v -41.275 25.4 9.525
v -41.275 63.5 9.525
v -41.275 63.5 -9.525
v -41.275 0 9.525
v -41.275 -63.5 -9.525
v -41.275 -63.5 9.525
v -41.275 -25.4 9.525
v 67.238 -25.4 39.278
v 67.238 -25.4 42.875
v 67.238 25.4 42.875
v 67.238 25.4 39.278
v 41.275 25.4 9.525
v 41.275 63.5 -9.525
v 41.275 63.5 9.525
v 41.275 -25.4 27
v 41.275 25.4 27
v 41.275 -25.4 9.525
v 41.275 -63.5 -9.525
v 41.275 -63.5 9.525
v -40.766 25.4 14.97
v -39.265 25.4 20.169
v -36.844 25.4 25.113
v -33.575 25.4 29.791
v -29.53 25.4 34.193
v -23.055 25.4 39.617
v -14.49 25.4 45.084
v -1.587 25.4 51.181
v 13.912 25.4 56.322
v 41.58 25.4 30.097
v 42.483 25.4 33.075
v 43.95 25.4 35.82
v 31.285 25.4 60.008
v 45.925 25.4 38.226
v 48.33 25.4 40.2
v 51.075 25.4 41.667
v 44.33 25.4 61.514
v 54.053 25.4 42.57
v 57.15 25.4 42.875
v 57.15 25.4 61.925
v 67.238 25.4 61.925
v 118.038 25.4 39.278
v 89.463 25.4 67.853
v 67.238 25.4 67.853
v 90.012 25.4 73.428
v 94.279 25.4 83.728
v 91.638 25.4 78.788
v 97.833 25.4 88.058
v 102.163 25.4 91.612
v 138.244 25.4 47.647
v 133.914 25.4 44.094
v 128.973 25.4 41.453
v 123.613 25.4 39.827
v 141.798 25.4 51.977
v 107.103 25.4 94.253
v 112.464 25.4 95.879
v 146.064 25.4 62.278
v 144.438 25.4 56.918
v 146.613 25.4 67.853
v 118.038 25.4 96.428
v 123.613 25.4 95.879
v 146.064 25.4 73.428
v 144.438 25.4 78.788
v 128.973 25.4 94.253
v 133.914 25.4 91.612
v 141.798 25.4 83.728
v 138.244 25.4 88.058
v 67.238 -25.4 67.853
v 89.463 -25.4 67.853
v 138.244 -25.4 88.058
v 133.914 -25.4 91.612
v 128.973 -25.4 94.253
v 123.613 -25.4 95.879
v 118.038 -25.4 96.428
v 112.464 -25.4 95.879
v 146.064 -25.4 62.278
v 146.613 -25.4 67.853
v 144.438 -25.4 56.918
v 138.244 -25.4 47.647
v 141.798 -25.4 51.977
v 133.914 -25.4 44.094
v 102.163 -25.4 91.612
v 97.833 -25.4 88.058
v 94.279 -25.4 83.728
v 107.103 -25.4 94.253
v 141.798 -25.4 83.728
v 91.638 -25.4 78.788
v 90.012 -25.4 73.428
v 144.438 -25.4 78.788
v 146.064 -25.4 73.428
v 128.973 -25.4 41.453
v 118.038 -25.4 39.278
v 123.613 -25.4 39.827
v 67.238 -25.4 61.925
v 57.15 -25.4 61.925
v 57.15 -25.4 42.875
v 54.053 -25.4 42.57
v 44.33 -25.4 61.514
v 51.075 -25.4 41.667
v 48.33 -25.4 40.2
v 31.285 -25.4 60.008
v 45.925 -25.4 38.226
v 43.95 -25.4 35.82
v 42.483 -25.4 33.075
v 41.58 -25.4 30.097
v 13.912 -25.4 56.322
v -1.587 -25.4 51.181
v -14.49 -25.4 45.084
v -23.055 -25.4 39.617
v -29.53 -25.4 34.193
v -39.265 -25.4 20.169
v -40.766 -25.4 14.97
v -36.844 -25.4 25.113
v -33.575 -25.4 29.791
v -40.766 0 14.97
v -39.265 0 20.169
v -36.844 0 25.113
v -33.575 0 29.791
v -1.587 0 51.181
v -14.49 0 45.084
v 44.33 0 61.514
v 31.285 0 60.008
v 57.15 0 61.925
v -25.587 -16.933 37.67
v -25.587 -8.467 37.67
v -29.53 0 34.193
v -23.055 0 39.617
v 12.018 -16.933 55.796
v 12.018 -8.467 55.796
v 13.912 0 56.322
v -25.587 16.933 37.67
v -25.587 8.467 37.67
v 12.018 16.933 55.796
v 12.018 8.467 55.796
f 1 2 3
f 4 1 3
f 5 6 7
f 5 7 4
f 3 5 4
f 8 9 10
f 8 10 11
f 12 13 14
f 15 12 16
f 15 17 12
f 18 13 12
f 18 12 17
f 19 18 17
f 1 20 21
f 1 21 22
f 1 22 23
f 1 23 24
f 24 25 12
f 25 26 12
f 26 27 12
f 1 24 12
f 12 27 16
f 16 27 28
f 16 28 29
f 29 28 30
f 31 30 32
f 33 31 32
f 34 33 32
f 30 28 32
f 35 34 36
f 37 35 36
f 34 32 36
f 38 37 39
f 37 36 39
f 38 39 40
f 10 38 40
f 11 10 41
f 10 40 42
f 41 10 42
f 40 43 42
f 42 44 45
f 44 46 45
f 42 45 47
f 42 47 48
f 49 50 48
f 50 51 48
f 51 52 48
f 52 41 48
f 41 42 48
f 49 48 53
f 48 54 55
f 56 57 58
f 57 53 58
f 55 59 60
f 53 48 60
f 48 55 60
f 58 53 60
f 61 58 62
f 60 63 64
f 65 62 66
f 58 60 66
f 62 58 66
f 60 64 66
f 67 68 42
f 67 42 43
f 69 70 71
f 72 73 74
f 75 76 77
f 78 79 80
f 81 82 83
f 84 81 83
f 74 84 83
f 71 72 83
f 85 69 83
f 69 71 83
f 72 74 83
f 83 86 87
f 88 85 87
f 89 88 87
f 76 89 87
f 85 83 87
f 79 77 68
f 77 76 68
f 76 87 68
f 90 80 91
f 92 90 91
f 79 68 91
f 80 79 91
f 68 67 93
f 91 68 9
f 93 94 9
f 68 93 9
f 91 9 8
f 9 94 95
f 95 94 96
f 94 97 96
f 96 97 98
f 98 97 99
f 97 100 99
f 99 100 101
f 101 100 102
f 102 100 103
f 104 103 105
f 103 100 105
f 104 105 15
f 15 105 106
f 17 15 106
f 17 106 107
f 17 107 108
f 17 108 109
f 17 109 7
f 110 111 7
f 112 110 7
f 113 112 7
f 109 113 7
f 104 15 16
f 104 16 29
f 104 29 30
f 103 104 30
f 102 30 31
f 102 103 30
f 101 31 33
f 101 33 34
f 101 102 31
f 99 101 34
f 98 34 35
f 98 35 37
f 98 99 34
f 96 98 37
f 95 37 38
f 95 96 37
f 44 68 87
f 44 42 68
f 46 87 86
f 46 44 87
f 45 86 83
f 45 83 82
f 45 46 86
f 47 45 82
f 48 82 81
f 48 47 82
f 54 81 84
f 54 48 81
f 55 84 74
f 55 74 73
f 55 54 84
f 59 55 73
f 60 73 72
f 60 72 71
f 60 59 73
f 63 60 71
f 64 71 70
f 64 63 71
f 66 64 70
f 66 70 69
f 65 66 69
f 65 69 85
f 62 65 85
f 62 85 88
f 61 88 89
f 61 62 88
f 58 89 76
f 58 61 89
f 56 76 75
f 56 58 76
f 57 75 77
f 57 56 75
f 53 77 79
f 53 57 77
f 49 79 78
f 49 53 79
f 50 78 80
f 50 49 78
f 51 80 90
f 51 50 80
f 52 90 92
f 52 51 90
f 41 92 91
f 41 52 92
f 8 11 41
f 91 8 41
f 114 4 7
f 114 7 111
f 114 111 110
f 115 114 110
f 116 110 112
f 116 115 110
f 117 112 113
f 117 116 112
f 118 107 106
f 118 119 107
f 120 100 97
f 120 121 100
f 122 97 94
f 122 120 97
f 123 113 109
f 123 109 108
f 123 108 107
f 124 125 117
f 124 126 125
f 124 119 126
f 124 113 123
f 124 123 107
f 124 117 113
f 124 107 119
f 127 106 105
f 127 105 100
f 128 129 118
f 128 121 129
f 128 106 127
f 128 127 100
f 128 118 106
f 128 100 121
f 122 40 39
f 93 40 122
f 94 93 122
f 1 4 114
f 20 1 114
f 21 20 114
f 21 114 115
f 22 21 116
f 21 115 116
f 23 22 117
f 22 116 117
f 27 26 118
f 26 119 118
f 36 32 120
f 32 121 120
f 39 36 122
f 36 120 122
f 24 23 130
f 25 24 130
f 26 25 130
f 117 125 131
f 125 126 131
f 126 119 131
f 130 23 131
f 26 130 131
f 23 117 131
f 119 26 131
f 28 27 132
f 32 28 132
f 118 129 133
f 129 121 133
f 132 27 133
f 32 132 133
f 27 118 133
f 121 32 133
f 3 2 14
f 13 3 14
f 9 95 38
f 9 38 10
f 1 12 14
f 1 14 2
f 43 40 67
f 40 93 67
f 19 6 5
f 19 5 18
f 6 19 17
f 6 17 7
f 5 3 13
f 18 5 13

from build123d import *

# Parameters (mm, degrees)
F1_DEPTH  = 63.5
F0_W      = 26.6759653056
F0_H      = 19.05
F0_H_2    = 5.927620608
F2_DEPTH  = 25.4
F2_FACE_W = 50.8
F2_FACE_H = 28.575


with BuildPart() as f1:
    # F0 (on Front) → F1 (new body, symmetric)
    with BuildSketch(Plane.XZ):
        Polygon((-41.275, 9.525), (-41.275, -9.525), (41.275, -9.525), (41.275, 9.525), (22.225, 9.525), align=None)
    extrude(amount=F1_DEPTH, both=True)

    # F0 (on Front) → F2 (join, symmetric)
    with BuildSketch(Plane.XZ):
        Polygon((-41.275, 9.525), (-41.275, -9.525), (41.275, -9.525), (41.275, 9.525), (22.225, 9.525), align=None)
        with BuildLine():
            add(Edge.make_bspline(
                [(-41.275, 9.525), (-41.3433387876, 42.0196428895), (13.0519531667, 62.4538473785), (57.15, 61.9252)],
                knots=[0, 0, 0, 0, 111.5045361635, 111.5045361635, 111.5045361635, 111.5045361635], degree=3))
            Line((-41.275, 9.525), (22.225, 9.525))
            Line((22.225, 9.525), (22.225, 27.0002))
            ThreePointArc((22.225, 27.0002), (32.4542956671, 51.6959043329), (57.15, 61.9252))
        make_face()
        with BuildLine():
            Line((22.225, 9.525), (41.275, 9.525))
            Line((41.275, 9.525), (41.275, 27.0002))
            ThreePointArc((41.275, 27.0002), (45.9246798487, 38.2255201513), (57.15, 42.8752))
            Line((57.15, 42.8752), (67.2383028494, 42.8752))
            Line((67.2383028494, 42.8752), (67.2383028494, 61.9252))
            Line((67.2383028494, 61.9252), (57.15, 61.9252))
            ThreePointArc((57.15, 61.9252), (32.4542956671, 51.6959043329), (22.225, 27.0002))
            Line((22.225, 27.0002), (22.225, 9.525))
        make_face()
        with Locations((80.5762855022, 52.4002)):
            Rectangle(F0_W, F0_H)
        with Locations((80.5762855022, 64.889010304)):
            Rectangle(F0_W, F0_H_2)
        Polygon((93.914268155, 42.8752), (67.2383028494, 42.8752), (67.2383028494, 39.277820608), (118.0383028494, 39.277820608), (118.0383028494, 67.852820608), (93.914268155, 67.852820608), (93.914268155, 61.9252), align=None)
    extrude(amount=F2_DEPTH, both=True)

    # F2_face (on face) → F3 (revolve)
    with BuildSketch(Plane(origin=(118.0383028494, 0, 53.565320608), x_dir=(0, 1, 0), z_dir=(1, 0, 0))):
        Rectangle(F2_FACE_W, F2_FACE_H)
    revolve(axis=Axis((118.0383028494, 0, 67.852820608), (0, 1, 0)))


solid = f1.part
